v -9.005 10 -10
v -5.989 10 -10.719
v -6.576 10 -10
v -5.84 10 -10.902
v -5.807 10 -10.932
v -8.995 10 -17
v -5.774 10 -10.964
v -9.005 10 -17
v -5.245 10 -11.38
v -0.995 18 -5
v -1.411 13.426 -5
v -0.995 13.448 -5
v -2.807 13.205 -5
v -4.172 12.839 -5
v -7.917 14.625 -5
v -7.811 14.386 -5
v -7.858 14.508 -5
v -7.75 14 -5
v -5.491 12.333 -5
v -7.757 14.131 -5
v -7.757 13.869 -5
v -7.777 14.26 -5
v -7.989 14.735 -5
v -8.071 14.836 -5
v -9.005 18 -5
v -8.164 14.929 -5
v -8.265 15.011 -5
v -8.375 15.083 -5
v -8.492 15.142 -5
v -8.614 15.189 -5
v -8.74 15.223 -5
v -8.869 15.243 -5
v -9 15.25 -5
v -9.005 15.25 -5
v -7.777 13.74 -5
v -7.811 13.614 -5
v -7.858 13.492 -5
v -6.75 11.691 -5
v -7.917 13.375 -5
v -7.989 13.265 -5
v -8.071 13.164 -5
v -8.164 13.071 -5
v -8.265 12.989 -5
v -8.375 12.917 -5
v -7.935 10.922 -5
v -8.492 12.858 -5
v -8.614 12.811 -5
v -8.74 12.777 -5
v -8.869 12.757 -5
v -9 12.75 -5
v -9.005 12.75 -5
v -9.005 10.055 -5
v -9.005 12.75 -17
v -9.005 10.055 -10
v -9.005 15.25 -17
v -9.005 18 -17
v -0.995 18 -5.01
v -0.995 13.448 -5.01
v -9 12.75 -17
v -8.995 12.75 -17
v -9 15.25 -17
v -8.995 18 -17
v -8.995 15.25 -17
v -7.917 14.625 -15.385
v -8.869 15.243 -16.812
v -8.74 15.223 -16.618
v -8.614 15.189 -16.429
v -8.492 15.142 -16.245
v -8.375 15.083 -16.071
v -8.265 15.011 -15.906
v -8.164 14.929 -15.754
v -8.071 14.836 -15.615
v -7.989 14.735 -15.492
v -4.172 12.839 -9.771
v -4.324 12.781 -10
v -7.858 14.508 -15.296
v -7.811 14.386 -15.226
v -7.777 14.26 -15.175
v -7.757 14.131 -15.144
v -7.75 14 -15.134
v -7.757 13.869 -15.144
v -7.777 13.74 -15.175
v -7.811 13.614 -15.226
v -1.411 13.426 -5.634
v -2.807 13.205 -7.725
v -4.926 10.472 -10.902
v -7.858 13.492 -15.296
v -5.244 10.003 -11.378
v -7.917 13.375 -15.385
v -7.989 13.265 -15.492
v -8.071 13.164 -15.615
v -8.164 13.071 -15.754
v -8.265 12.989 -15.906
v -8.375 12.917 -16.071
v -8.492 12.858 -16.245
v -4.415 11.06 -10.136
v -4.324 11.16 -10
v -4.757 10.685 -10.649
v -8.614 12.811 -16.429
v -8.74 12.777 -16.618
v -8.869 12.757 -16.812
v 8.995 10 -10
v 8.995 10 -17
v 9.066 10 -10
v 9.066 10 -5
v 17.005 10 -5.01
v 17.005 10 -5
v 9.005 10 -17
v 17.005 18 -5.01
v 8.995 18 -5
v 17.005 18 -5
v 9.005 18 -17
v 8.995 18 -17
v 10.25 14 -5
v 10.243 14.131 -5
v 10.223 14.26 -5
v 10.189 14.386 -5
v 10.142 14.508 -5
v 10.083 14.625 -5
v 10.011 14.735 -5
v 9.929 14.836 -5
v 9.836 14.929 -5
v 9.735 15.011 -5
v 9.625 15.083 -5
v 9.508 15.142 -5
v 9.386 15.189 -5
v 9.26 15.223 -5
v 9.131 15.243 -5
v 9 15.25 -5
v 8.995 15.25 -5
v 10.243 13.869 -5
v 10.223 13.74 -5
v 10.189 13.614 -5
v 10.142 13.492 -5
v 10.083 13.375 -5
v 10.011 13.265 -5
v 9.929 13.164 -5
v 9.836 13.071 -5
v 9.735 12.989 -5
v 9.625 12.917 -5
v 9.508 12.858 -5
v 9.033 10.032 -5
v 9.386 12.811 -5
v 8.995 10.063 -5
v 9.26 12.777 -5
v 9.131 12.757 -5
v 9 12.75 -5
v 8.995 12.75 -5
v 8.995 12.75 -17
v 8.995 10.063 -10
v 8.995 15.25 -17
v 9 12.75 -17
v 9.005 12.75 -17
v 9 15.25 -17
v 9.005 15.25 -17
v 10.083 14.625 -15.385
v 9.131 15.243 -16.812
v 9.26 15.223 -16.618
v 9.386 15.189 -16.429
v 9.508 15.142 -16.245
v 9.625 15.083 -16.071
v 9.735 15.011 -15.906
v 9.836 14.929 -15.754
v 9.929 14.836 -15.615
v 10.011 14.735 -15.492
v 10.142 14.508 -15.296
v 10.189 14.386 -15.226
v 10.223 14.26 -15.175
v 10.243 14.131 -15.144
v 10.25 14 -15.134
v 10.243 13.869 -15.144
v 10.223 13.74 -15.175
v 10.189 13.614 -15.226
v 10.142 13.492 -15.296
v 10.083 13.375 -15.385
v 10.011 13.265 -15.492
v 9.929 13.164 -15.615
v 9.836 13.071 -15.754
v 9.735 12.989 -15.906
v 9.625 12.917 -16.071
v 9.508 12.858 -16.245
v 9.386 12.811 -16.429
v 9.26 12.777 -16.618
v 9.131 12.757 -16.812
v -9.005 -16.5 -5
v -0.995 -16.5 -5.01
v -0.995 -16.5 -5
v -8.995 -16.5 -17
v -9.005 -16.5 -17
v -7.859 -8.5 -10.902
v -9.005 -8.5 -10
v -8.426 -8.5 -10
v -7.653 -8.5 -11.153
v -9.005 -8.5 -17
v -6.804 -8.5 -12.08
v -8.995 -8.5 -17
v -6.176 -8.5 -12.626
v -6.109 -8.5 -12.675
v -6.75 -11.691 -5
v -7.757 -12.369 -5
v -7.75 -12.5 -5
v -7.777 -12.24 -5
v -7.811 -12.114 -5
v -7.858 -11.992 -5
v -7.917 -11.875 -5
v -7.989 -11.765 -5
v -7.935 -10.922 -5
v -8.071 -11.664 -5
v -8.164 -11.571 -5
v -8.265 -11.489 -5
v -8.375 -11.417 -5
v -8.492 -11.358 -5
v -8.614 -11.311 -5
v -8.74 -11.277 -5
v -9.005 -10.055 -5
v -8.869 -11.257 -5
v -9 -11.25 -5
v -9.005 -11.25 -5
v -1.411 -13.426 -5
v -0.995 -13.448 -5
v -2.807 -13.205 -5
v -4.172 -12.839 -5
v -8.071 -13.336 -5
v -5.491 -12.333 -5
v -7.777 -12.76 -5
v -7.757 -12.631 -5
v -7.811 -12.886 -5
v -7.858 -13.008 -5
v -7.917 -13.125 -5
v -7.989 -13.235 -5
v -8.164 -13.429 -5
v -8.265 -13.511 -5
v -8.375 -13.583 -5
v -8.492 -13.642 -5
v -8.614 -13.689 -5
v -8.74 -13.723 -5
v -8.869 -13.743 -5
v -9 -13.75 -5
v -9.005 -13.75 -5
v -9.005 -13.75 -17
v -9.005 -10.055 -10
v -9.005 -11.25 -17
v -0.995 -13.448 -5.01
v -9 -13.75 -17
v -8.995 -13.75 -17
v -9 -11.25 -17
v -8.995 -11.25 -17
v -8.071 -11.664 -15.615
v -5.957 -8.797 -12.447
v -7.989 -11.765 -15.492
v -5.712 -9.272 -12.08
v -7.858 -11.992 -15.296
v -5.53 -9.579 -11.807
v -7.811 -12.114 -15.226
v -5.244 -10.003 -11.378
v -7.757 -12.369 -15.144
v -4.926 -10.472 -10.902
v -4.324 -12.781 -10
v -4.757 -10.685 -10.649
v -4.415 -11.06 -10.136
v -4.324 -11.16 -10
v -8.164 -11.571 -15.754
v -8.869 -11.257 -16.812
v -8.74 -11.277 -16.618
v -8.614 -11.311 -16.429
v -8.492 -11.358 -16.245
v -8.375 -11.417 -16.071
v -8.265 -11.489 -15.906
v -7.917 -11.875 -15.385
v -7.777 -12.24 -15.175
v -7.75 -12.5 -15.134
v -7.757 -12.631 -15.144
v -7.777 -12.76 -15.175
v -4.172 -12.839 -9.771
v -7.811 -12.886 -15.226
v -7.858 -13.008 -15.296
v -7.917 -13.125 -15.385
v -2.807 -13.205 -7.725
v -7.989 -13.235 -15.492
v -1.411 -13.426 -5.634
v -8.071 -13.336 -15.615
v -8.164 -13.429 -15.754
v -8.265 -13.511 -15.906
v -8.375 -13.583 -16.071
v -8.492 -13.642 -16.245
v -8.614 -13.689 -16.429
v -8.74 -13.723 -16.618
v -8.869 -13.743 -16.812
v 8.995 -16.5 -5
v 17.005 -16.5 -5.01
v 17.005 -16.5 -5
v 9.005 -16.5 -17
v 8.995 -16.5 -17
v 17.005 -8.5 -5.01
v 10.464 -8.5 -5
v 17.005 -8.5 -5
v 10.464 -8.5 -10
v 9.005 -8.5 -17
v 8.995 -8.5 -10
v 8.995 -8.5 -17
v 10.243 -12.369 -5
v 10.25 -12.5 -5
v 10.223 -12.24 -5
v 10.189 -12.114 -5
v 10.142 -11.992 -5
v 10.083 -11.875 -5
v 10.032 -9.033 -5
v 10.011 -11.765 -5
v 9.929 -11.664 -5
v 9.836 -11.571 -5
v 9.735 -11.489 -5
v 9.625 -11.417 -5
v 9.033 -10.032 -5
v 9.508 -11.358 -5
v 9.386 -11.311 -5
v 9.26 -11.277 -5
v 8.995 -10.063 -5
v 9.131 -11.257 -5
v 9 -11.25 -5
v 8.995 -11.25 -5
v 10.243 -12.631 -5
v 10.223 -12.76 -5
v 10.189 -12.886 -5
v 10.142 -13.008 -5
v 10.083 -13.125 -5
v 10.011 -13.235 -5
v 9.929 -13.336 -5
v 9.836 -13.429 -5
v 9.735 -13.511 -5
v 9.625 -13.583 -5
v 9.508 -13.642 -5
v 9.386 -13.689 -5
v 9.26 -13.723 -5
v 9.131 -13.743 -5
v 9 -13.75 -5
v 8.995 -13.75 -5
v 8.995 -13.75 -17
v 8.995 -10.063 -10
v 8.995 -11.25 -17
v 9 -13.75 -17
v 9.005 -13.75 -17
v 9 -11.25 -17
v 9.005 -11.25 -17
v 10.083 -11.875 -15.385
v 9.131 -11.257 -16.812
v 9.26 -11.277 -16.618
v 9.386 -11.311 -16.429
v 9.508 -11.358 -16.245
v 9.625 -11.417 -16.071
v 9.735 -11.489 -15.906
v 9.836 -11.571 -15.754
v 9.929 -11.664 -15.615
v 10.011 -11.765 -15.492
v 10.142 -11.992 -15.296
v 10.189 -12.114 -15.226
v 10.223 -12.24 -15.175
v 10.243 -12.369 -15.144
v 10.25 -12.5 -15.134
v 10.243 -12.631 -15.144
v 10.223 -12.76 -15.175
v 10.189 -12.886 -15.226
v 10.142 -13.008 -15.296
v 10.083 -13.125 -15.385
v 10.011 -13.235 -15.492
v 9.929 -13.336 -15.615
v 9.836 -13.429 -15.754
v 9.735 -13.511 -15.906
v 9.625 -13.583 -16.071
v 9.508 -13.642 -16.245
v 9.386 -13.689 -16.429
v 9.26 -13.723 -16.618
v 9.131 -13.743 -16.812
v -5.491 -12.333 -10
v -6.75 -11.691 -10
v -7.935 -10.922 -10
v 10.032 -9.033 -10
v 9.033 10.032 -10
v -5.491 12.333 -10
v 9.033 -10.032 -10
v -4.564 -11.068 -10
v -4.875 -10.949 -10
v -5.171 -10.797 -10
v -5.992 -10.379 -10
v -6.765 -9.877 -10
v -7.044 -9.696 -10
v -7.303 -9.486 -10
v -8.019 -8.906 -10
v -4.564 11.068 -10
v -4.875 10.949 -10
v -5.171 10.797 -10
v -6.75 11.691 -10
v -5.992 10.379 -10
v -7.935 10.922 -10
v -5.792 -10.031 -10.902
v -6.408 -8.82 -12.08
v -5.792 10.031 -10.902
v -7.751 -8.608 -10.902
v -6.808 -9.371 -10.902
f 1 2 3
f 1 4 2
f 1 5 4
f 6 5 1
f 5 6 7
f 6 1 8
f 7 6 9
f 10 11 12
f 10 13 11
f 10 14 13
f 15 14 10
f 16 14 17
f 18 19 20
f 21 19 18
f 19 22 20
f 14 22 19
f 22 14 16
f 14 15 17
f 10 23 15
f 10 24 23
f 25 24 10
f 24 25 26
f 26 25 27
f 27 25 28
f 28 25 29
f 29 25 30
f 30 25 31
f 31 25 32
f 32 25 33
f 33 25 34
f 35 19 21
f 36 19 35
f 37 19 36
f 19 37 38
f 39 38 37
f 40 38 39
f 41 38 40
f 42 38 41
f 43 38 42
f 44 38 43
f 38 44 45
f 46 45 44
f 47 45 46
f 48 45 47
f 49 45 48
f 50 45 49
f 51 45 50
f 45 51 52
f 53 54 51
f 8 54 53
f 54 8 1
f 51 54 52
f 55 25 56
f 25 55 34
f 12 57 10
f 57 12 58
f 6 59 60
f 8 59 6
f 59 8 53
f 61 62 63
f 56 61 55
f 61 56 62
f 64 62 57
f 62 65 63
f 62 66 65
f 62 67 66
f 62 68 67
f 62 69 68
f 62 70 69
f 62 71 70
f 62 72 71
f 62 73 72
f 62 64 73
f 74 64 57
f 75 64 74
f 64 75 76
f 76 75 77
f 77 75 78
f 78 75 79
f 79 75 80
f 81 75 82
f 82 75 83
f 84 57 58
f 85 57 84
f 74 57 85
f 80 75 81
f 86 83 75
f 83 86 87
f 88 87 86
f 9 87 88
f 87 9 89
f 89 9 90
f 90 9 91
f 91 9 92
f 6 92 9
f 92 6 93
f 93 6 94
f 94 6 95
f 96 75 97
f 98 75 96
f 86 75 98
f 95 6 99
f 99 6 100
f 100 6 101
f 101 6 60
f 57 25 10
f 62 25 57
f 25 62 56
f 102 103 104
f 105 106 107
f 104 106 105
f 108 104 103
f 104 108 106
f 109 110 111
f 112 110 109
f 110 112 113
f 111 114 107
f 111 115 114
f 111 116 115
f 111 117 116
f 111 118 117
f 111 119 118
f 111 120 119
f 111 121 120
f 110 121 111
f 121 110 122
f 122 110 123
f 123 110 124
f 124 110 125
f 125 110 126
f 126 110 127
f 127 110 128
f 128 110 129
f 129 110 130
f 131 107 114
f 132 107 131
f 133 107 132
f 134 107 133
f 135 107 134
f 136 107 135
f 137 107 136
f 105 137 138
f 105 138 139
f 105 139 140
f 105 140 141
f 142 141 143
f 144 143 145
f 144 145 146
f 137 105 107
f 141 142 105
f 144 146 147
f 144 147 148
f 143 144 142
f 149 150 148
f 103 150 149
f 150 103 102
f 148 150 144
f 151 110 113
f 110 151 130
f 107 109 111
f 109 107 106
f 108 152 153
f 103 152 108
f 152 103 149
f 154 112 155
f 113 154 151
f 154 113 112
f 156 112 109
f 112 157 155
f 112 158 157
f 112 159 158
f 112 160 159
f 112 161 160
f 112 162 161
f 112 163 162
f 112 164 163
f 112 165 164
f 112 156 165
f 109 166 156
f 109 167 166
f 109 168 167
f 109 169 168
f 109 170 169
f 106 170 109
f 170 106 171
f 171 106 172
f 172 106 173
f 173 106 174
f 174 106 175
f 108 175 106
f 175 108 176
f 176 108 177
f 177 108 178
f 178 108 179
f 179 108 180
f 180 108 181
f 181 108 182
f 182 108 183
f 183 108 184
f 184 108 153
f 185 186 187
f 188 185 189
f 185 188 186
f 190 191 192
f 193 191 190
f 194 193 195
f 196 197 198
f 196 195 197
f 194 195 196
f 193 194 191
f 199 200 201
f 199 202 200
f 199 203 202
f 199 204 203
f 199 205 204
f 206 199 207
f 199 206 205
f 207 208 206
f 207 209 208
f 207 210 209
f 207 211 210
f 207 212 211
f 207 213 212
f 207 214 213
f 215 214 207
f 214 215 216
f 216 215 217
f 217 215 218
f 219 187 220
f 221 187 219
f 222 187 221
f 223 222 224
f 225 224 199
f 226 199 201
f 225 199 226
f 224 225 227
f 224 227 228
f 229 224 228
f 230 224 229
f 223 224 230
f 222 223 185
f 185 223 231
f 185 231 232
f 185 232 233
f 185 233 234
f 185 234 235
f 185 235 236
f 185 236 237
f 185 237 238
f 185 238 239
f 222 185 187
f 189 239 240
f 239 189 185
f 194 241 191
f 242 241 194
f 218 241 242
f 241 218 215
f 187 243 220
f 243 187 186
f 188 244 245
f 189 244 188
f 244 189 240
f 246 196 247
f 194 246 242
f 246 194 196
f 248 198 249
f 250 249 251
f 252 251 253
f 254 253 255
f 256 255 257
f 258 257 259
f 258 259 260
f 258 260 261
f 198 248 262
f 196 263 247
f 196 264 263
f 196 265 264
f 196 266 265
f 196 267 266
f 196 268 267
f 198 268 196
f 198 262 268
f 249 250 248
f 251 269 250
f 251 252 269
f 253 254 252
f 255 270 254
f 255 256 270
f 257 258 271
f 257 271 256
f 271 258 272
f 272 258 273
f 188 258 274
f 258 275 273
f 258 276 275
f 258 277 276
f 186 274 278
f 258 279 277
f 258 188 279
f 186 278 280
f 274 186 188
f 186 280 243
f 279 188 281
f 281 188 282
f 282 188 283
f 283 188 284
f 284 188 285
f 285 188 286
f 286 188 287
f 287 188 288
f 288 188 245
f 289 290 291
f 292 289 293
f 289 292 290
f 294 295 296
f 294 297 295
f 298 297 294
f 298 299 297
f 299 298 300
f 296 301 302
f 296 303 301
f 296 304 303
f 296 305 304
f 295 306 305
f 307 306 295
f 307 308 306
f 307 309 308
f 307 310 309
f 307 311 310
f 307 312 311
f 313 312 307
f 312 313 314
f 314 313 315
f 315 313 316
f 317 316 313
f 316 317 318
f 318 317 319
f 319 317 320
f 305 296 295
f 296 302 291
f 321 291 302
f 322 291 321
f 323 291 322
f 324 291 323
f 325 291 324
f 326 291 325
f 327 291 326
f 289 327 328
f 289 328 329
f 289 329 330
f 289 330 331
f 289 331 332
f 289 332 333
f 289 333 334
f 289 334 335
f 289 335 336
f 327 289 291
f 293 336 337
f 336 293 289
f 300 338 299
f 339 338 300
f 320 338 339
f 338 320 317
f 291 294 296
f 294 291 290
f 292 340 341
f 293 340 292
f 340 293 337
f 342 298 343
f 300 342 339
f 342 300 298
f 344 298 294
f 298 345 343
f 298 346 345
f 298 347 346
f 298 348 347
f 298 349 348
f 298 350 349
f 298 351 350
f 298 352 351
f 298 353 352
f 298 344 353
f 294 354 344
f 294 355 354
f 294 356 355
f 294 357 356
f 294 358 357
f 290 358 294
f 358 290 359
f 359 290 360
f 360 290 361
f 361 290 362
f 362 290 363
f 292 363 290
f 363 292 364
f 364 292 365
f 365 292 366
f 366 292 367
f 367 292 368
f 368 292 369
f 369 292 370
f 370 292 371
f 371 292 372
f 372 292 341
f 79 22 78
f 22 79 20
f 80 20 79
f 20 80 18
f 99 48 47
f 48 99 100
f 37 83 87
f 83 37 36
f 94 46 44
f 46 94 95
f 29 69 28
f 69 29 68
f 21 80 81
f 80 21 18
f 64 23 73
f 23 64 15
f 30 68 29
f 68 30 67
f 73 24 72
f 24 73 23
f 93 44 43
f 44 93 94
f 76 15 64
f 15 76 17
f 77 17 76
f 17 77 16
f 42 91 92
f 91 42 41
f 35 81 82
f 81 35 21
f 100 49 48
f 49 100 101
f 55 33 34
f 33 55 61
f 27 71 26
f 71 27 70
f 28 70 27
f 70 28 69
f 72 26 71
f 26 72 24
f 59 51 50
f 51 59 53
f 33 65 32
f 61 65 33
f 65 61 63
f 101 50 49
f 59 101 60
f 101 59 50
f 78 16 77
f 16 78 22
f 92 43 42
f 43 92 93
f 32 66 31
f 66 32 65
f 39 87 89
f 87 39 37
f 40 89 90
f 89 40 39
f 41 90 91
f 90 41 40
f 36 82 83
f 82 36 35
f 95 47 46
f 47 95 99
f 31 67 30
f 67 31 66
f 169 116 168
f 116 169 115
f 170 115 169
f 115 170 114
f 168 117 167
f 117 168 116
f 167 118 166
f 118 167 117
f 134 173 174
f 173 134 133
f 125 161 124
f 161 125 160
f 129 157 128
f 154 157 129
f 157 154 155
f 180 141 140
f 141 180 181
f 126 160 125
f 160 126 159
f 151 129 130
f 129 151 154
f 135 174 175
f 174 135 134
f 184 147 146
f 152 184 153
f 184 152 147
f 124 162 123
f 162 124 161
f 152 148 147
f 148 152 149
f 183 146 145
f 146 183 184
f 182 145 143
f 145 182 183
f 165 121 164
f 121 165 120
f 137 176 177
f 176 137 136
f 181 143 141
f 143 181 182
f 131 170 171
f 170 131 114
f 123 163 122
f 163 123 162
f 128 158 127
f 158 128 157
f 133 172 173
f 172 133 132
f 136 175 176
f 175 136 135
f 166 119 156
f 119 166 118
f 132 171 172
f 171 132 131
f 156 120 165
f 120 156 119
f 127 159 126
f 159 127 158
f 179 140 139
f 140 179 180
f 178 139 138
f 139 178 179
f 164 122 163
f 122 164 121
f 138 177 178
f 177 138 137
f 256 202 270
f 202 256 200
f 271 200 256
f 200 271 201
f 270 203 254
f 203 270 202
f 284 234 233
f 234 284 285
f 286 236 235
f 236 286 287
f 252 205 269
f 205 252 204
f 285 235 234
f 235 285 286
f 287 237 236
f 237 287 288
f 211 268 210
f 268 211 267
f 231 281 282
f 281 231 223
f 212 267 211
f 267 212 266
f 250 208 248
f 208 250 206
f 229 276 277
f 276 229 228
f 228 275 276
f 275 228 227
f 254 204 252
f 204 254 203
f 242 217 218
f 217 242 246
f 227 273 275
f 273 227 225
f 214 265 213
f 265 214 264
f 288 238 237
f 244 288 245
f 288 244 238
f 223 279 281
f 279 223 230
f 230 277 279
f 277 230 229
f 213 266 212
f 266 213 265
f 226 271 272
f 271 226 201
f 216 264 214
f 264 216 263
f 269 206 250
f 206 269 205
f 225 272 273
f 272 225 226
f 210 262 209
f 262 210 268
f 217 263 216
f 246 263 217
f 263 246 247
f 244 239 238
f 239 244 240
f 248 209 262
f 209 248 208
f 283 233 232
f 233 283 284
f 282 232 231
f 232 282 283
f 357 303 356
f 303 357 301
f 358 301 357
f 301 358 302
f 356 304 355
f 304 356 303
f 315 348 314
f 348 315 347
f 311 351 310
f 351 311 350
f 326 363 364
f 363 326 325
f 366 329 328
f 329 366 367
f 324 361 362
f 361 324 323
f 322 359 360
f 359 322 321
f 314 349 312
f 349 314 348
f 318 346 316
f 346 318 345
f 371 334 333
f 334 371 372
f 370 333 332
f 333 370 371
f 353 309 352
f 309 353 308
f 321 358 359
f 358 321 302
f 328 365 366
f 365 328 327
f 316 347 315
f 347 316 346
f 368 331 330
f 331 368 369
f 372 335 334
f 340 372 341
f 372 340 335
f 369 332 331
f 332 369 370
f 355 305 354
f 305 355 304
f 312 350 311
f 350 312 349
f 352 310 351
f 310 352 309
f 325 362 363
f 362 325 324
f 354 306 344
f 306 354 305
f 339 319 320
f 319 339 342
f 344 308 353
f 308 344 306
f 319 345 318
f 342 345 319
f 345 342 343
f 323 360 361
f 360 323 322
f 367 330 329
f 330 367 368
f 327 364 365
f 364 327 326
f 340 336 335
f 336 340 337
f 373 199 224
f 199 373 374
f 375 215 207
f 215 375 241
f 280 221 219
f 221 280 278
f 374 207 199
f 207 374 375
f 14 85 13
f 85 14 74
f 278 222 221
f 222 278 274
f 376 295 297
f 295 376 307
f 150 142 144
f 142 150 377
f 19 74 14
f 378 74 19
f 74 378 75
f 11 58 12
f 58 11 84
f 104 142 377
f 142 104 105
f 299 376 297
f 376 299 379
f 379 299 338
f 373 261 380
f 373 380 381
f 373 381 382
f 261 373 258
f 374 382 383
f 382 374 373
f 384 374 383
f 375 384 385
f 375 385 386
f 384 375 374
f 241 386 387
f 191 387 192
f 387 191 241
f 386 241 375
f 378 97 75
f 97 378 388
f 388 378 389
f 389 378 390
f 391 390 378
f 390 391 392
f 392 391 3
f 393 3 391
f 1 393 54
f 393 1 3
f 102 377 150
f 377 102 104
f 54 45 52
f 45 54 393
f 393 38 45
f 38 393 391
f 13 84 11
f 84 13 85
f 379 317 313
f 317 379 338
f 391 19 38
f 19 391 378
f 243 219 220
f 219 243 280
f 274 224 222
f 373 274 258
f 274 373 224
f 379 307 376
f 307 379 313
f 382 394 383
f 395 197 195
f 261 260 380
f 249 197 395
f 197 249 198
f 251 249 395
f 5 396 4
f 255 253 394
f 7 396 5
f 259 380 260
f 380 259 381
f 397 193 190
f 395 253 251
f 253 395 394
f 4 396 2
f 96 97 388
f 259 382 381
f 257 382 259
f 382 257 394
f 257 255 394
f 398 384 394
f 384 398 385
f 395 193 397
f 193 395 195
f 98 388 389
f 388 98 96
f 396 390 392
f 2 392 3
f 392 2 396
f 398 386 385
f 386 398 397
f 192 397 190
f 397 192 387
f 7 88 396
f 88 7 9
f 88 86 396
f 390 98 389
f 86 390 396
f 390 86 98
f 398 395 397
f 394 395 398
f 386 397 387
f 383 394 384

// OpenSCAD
// ChromaCade - Joystick (KY-023) mounting boss development, in isolation
//
// Pulled out of chromacade-blank-side.scad 2026-08-19 per direct feedback
// on the first printed test: straight-up-and-down bosses (see git history,
// joystick_mount_bosses() before this date) got in the way of the
// joystick's own range of motion, two of the four didn't have enough
// material to fully encase their screws (would break under real toddler
// use), and -- found independently while redesigning -- weren't actually
// support-free to print despite being built with a hull()-based taper.
// Work on the boss shape HERE, in isolation, until it's right, then port
// the final joy_boss_*/joy_gimbal_* constants and modules back into
// chromacade-blank-side.scad's joystick_mount_bosses()/
// joystick_mount_pilot_holes() (and chromacade-fit-check.scad's mirrored
// copy) to replace the removed originals.
//
// WHY THE ORIGINAL RAMP DIDN'T ACTUALLY WORK: chromacade-blank-side.scad
// prints with its own +X endcap face-down on the bed -- print-vertical =
// global X, and BLANK-SIDE SPECIFICALLY builds toward -X as printing
// proceeds (own_mount_boss()'s comment: bosses there extend "toward +X,
// this piece's own bed/endcap side"). The shelf's local frame only rotates
// about the GLOBAL X axis (rotate([-shelf_a,0,0])), so local X *is* global
// X unchanged -- tapering a shape uniformly along *local Z* (the first
// attempt) doesn't taper it along the axis that actually matters for
// printability at all. A boss needs to go from a THIN, X-shifted sliver
// (printed early/near the bed, high X) to its FULL true-position
// cross-section (printed late, low X) -- exactly like square_boss()'s and
// own_mount_boss()'s existing ramps in the real files.
//
// REDESIGNED AGAIN 2026-08-19 (second pass) -- the first ramped version
// (a hole-clipped wedge, r_inner..r_outer, angularly clipped per boss)
// fixed the print-support problem but, per direct feedback, still didn't
// remove any material from the joystick's actual moving space: clipping
// each boss against the flat 27mm hole radius only protects the visible
// stick opening, not the gimbal mechanism's real swept volume underneath
// the board, which isn't flat/cylindrical.
//
// THE DESIGN HERE:
//   1. Each boss is a SIMPLE post -- constant ramp_w x ramp_w
//      cross-section, no wedge/angular-clipping math at all -- built with
//      the exact same thin-slice hull() ramp technique as before (full
//      height at the board's TRUE pilot position, tapering to zero height
//      at a point shifted ramp_x toward +X for print support). No radial
//      shift, no hole-radius clipping -- the boss just reaches straight
//      from the true pilot position back to the shelf, angled only for
//      printability.
//   2. A SPHERE (joy_gimbal_clearance_dev(), diameter joy_gimbal_d)
//      centered on the stick hole's own center, subtracted from the whole
//      assembly, models the joystick's real gimbal swing far more
//      accurately than clipping against the flat hole ever could: at the
//      shelf surface it's slightly SMALLER than the stick hole itself (so
//      it removes nothing new above the shelf -- the existing hole cut
//      already reaches further there), but below the shelf its curved
//      surface reaches sideways into each post's inner corner (the side
//      facing the hole), exactly where the gimbal actually needs to swing
//      through. Verified numerically (see git history / commit message)
//      that this reaches every post's true-position end by 0.4-4.6mm and
//      partially reaches the shifted/ramped end for the two posts nearest
//      center (front-left, back-left) -- all four keep real material on
//      their outward (away-from-hole) side either way, which is what
//      actually carries the screw load; the side facing the hole was never
//      load-bearing.
//
// HOW TO USE
//   - PART = "ASSEMBLY" shows all 4 posts + the stick hole + the gimbal
//     sphere cut together, no surrounding plate (for a quick look, not for
//     printing directly).
//   - PART = "SINGLE" isolates one post (see single_which below) for a
//     close look.
//   - PART = "PRINTABLE" is the actual print-ready coupon -- a small slab
//     of "shelf" material with the stick hole + all 4 posts, ALREADY
//     rotated so the ramp direction points straight down. Slice this
//     directly, no manual reorientation needed (unlike ASSEMBLY/SINGLE).
//     This replaces the old test-mk2.scad plate B, which was removed
//     2026-08-19 since its flat-plate convention doesn't fit this design's
//     print-orientation requirement (see the warning below).
//   - PRINT ORIENTATION WARNING (for ASSEMBLY/SINGLE only -- PRINTABLE
//     already handles this): this file's own local coordinate frame does
//     NOT match how OpenSCAD's default camera/build plate looks --
//     +X here is deliberately the ramp/taper direction, matching
//     blank-side's real -X-toward-bed print direction (see the long
//     comment above). If you slice this in isolation, orient it so
//     GLOBAL +X points DOWN toward the print bed (i.e. rotate the whole
//     assembly -90 about Y in your slicer) to see the same support
//     behavior the real embedded print will have. Don't just print it
//     "as viewed" without doing that rotation -- it'll look support-free
//     in a naive orientation and then need support once actually embedded.
$fn = 60;

/* [Render Selection] */
PART = "ASSEMBLY";
// [ASSEMBLY, SINGLE, PRINTABLE, PLATE_PREVIEW]
single_which = 0; // 0-3, only used when PART="SINGLE" -- see joy_positions below

wall = 5; // matches case wall thickness

// --- Real hardware measurements (2026-08-18/19, see chromacade-blank-side.scad) ---
joy_stick_d = 27;   // UNDER TEST -- current best guess, see test-mk2.scad plate B
hole_dx     = 9;    // board hole +/-9mm left-right, both pairs
front_dy    = 14;   // front pair (toward speaker wall), 14mm off joystick center
back_dy     = -12.5; // back pair (toward device center), 12.5mm off center
boss_h      = 12;   // MEASURED-derived standoff height (matches the board+header stack)
pilot_d     = 2.5;  // ESTIMATE -- confirm the board's actual screw size

// --- Post shape parameters -- THIS is what you're iterating on ---
ramp_x = 8; // print-support taper run, toward +X (blank-side's own
            // bed/endcap side) -- 12mm boss_h over 8mm run is a ~56deg
            // overhang (not a full 45deg, but a large improvement over a
            // sheer 90deg cliff); widen if the print still needs support,
            // watch the font encoder at shelf x=-35 (only ~+30mm away in
            // this hole-centered frame) if you do
ramp_w = 8; // post cross-section, both ends -- sized for M2.5 (pilot_d
            // 2.5mm) wall thickness before the gimbal sphere carves in

// --- Gimbal clearance ---
joy_gimbal_d = 26; // sphere diameter -- models the joystick's real
                    // mechanical swing, centered on the stick hole's own
                    // center at the shelf surface (z=-wall). Deliberately
                    // smaller than joy_stick_d (27mm) so it removes
                    // nothing new above the shelf (the existing stick-hole
                    // cut already reaches further there) -- all its real
                    // effect is below the shelf, carving into whichever
                    // post material happens to intrude on the gimbal's
                    // actual swept volume.

joy_positions = [
    [-hole_dx, front_dy],
    [ hole_dx, front_dy],
    [-hole_dx, back_dy],
    [ hole_dx, back_dy],
];

// Simple post: thin X-slices at both ends (matching square_boss()'s own
// technique), height tapering from full (at the board's true pilot
// position) to zero (ramp_x further toward +X). No hole-radius clipping
// at all -- the gimbal sphere (below) is what actually keeps this clear
// of the joystick's moving parts, more accurately than any flat clip
// could.
module joy_boss_dev(cx, cy) {
    hull() {
        translate([cx - 0.005, cy - ramp_w/2, -wall - boss_h])
        cube([0.01, ramp_w, boss_h]);

        translate([cx + ramp_x - 0.005, cy - ramp_w/2, -wall - 0.01])
        cube([0.01, ramp_w, 0.01]);
    }
}

module joy_pilot_hole_dev(cx, cy) {
    translate([cx, cy, -wall - boss_h - 0.5])
    cylinder(h = boss_h + 1, d = pilot_d);
}

module joy_stick_hole_dev() {
    translate([0, 0, 0])
    cylinder(h = wall*4, d = joy_stick_d, center = true);
}

module joy_gimbal_clearance_dev() {
    translate([0, 0, -wall])
    sphere(d = joy_gimbal_d);
}

module assembly_dev() {
    difference() {
        union() {
            for (p = joy_positions)
                joy_boss_dev(p[0], p[1]);
        }
        joy_stick_hole_dev();
        joy_gimbal_clearance_dev();
        for (p = joy_positions)
            joy_pilot_hole_dev(p[0], p[1]);
    }
}

module single_dev(i) {
    p = joy_positions[i];
    difference() {
        joy_boss_dev(p[0], p[1]);
        joy_gimbal_clearance_dev();
        joy_pilot_hole_dev(p[0], p[1]);
    }
}

// Print-ready coupon: a small slab of "shelf" material (plate_w x plate_h,
// plate_t thick) at the shelf-surface reference (z=-wall), with the stick
// hole + gimbal sphere + all 4 posts + pilot holes, THEN rotated so the
// ramp direction (local +X, matching blank-side's real bed/endcap side)
// points straight down -- no manual slicer rotation needed, unlike a bare
// ASSEMBLY export. rotate([0,90,0]) maps local +X to new -Z (down):
// confirmed by direct derivation (rotation about Y by 90 deg sends
// (x,y,z) -> (z,y,-x), so a point at local x=X0>0 lands at new z=-X0, i.e.
// below the origin).
// plate_w matters more than it looks like it should: it becomes the
// PRINTED HEIGHT after rotation (see printable_dev()'s own comment) since
// local +X has to map to vertical for the ramps to work -- kept tight
// (44mm, matching the size you had in mind) rather than an arbitrary
// round number, sized to the posts' actual X-spread: leftmost point is a
// front/back-left post's own true position (x=-9), rightmost is a
// front/back-right post's shifted ramp end (x=9+ramp_x=17), plus ~4mm
// margin each side for the post's own half-width -> -13 to 21, 34mm,
// centered at x=4 with room to spare at 44mm.
plate_w = 44; plate_h = 44; plate_t = 4;
plate_cx = 4; // see plate_w comment -- NOT 0, the post spread isn't symmetric

module printable_dev() {
    // WARNING: this print comes out TALL AND NARROW-FOOTPRINT (plate_w=44mm
    // tall in Z, only plate_t=4mm x plate_h=44mm on the bed) -- unavoidable
    // given local +X (the ramp axis) has to become vertical for the posts
    // to print without support; there's no way to also make the bed
    // footprint square without breaking that. Add a brim in your slicer
    // for bed adhesion; this isn't a sign anything is wrong.
    rotate([0, 90, 0])
    difference() {
        union() {
            translate([plate_cx - plate_w/2, -plate_h/2, -wall - plate_t])
            cube([plate_w, plate_h, plate_t]);
            assembly_dev();
        }
        // re-cut the stick/gimbal/pilot holes: assembly_dev()'s own
        // difference() already relieved the posts internally, but the
        // NEW plate (unioned in afterward) still needs its own overlapping
        // portion of each cut through it too.
        joy_stick_hole_dev();
        joy_gimbal_clearance_dev();
        for (p = joy_positions)
            joy_pilot_hole_dev(p[0], p[1]);
    }
}

// Same content as PRINTABLE (plate + posts + all cuts) but WITHOUT the
// print rotation -- for visually checking the plate/post relationship in
// this file's natural local frame (matching ASSEMBLY's camera-friendly
// orientation). Not for printing -- use PRINTABLE for that.
module plate_preview_dev() {
    difference() {
        union() {
            translate([plate_cx - plate_w/2, -plate_h/2, -wall - plate_t])
            cube([plate_w, plate_h, plate_t]);
            assembly_dev();
        }
        joy_stick_hole_dev();
        joy_gimbal_clearance_dev();
        for (p = joy_positions)
            joy_pilot_hole_dev(p[0], p[1]);
    }
}

if (PART == "ASSEMBLY") assembly_dev();
else if (PART == "PRINTABLE") printable_dev();
else if (PART == "SINGLE") single_dev(single_which);
else if (PART == "PLATE_PREVIEW") plate_preview_dev();
